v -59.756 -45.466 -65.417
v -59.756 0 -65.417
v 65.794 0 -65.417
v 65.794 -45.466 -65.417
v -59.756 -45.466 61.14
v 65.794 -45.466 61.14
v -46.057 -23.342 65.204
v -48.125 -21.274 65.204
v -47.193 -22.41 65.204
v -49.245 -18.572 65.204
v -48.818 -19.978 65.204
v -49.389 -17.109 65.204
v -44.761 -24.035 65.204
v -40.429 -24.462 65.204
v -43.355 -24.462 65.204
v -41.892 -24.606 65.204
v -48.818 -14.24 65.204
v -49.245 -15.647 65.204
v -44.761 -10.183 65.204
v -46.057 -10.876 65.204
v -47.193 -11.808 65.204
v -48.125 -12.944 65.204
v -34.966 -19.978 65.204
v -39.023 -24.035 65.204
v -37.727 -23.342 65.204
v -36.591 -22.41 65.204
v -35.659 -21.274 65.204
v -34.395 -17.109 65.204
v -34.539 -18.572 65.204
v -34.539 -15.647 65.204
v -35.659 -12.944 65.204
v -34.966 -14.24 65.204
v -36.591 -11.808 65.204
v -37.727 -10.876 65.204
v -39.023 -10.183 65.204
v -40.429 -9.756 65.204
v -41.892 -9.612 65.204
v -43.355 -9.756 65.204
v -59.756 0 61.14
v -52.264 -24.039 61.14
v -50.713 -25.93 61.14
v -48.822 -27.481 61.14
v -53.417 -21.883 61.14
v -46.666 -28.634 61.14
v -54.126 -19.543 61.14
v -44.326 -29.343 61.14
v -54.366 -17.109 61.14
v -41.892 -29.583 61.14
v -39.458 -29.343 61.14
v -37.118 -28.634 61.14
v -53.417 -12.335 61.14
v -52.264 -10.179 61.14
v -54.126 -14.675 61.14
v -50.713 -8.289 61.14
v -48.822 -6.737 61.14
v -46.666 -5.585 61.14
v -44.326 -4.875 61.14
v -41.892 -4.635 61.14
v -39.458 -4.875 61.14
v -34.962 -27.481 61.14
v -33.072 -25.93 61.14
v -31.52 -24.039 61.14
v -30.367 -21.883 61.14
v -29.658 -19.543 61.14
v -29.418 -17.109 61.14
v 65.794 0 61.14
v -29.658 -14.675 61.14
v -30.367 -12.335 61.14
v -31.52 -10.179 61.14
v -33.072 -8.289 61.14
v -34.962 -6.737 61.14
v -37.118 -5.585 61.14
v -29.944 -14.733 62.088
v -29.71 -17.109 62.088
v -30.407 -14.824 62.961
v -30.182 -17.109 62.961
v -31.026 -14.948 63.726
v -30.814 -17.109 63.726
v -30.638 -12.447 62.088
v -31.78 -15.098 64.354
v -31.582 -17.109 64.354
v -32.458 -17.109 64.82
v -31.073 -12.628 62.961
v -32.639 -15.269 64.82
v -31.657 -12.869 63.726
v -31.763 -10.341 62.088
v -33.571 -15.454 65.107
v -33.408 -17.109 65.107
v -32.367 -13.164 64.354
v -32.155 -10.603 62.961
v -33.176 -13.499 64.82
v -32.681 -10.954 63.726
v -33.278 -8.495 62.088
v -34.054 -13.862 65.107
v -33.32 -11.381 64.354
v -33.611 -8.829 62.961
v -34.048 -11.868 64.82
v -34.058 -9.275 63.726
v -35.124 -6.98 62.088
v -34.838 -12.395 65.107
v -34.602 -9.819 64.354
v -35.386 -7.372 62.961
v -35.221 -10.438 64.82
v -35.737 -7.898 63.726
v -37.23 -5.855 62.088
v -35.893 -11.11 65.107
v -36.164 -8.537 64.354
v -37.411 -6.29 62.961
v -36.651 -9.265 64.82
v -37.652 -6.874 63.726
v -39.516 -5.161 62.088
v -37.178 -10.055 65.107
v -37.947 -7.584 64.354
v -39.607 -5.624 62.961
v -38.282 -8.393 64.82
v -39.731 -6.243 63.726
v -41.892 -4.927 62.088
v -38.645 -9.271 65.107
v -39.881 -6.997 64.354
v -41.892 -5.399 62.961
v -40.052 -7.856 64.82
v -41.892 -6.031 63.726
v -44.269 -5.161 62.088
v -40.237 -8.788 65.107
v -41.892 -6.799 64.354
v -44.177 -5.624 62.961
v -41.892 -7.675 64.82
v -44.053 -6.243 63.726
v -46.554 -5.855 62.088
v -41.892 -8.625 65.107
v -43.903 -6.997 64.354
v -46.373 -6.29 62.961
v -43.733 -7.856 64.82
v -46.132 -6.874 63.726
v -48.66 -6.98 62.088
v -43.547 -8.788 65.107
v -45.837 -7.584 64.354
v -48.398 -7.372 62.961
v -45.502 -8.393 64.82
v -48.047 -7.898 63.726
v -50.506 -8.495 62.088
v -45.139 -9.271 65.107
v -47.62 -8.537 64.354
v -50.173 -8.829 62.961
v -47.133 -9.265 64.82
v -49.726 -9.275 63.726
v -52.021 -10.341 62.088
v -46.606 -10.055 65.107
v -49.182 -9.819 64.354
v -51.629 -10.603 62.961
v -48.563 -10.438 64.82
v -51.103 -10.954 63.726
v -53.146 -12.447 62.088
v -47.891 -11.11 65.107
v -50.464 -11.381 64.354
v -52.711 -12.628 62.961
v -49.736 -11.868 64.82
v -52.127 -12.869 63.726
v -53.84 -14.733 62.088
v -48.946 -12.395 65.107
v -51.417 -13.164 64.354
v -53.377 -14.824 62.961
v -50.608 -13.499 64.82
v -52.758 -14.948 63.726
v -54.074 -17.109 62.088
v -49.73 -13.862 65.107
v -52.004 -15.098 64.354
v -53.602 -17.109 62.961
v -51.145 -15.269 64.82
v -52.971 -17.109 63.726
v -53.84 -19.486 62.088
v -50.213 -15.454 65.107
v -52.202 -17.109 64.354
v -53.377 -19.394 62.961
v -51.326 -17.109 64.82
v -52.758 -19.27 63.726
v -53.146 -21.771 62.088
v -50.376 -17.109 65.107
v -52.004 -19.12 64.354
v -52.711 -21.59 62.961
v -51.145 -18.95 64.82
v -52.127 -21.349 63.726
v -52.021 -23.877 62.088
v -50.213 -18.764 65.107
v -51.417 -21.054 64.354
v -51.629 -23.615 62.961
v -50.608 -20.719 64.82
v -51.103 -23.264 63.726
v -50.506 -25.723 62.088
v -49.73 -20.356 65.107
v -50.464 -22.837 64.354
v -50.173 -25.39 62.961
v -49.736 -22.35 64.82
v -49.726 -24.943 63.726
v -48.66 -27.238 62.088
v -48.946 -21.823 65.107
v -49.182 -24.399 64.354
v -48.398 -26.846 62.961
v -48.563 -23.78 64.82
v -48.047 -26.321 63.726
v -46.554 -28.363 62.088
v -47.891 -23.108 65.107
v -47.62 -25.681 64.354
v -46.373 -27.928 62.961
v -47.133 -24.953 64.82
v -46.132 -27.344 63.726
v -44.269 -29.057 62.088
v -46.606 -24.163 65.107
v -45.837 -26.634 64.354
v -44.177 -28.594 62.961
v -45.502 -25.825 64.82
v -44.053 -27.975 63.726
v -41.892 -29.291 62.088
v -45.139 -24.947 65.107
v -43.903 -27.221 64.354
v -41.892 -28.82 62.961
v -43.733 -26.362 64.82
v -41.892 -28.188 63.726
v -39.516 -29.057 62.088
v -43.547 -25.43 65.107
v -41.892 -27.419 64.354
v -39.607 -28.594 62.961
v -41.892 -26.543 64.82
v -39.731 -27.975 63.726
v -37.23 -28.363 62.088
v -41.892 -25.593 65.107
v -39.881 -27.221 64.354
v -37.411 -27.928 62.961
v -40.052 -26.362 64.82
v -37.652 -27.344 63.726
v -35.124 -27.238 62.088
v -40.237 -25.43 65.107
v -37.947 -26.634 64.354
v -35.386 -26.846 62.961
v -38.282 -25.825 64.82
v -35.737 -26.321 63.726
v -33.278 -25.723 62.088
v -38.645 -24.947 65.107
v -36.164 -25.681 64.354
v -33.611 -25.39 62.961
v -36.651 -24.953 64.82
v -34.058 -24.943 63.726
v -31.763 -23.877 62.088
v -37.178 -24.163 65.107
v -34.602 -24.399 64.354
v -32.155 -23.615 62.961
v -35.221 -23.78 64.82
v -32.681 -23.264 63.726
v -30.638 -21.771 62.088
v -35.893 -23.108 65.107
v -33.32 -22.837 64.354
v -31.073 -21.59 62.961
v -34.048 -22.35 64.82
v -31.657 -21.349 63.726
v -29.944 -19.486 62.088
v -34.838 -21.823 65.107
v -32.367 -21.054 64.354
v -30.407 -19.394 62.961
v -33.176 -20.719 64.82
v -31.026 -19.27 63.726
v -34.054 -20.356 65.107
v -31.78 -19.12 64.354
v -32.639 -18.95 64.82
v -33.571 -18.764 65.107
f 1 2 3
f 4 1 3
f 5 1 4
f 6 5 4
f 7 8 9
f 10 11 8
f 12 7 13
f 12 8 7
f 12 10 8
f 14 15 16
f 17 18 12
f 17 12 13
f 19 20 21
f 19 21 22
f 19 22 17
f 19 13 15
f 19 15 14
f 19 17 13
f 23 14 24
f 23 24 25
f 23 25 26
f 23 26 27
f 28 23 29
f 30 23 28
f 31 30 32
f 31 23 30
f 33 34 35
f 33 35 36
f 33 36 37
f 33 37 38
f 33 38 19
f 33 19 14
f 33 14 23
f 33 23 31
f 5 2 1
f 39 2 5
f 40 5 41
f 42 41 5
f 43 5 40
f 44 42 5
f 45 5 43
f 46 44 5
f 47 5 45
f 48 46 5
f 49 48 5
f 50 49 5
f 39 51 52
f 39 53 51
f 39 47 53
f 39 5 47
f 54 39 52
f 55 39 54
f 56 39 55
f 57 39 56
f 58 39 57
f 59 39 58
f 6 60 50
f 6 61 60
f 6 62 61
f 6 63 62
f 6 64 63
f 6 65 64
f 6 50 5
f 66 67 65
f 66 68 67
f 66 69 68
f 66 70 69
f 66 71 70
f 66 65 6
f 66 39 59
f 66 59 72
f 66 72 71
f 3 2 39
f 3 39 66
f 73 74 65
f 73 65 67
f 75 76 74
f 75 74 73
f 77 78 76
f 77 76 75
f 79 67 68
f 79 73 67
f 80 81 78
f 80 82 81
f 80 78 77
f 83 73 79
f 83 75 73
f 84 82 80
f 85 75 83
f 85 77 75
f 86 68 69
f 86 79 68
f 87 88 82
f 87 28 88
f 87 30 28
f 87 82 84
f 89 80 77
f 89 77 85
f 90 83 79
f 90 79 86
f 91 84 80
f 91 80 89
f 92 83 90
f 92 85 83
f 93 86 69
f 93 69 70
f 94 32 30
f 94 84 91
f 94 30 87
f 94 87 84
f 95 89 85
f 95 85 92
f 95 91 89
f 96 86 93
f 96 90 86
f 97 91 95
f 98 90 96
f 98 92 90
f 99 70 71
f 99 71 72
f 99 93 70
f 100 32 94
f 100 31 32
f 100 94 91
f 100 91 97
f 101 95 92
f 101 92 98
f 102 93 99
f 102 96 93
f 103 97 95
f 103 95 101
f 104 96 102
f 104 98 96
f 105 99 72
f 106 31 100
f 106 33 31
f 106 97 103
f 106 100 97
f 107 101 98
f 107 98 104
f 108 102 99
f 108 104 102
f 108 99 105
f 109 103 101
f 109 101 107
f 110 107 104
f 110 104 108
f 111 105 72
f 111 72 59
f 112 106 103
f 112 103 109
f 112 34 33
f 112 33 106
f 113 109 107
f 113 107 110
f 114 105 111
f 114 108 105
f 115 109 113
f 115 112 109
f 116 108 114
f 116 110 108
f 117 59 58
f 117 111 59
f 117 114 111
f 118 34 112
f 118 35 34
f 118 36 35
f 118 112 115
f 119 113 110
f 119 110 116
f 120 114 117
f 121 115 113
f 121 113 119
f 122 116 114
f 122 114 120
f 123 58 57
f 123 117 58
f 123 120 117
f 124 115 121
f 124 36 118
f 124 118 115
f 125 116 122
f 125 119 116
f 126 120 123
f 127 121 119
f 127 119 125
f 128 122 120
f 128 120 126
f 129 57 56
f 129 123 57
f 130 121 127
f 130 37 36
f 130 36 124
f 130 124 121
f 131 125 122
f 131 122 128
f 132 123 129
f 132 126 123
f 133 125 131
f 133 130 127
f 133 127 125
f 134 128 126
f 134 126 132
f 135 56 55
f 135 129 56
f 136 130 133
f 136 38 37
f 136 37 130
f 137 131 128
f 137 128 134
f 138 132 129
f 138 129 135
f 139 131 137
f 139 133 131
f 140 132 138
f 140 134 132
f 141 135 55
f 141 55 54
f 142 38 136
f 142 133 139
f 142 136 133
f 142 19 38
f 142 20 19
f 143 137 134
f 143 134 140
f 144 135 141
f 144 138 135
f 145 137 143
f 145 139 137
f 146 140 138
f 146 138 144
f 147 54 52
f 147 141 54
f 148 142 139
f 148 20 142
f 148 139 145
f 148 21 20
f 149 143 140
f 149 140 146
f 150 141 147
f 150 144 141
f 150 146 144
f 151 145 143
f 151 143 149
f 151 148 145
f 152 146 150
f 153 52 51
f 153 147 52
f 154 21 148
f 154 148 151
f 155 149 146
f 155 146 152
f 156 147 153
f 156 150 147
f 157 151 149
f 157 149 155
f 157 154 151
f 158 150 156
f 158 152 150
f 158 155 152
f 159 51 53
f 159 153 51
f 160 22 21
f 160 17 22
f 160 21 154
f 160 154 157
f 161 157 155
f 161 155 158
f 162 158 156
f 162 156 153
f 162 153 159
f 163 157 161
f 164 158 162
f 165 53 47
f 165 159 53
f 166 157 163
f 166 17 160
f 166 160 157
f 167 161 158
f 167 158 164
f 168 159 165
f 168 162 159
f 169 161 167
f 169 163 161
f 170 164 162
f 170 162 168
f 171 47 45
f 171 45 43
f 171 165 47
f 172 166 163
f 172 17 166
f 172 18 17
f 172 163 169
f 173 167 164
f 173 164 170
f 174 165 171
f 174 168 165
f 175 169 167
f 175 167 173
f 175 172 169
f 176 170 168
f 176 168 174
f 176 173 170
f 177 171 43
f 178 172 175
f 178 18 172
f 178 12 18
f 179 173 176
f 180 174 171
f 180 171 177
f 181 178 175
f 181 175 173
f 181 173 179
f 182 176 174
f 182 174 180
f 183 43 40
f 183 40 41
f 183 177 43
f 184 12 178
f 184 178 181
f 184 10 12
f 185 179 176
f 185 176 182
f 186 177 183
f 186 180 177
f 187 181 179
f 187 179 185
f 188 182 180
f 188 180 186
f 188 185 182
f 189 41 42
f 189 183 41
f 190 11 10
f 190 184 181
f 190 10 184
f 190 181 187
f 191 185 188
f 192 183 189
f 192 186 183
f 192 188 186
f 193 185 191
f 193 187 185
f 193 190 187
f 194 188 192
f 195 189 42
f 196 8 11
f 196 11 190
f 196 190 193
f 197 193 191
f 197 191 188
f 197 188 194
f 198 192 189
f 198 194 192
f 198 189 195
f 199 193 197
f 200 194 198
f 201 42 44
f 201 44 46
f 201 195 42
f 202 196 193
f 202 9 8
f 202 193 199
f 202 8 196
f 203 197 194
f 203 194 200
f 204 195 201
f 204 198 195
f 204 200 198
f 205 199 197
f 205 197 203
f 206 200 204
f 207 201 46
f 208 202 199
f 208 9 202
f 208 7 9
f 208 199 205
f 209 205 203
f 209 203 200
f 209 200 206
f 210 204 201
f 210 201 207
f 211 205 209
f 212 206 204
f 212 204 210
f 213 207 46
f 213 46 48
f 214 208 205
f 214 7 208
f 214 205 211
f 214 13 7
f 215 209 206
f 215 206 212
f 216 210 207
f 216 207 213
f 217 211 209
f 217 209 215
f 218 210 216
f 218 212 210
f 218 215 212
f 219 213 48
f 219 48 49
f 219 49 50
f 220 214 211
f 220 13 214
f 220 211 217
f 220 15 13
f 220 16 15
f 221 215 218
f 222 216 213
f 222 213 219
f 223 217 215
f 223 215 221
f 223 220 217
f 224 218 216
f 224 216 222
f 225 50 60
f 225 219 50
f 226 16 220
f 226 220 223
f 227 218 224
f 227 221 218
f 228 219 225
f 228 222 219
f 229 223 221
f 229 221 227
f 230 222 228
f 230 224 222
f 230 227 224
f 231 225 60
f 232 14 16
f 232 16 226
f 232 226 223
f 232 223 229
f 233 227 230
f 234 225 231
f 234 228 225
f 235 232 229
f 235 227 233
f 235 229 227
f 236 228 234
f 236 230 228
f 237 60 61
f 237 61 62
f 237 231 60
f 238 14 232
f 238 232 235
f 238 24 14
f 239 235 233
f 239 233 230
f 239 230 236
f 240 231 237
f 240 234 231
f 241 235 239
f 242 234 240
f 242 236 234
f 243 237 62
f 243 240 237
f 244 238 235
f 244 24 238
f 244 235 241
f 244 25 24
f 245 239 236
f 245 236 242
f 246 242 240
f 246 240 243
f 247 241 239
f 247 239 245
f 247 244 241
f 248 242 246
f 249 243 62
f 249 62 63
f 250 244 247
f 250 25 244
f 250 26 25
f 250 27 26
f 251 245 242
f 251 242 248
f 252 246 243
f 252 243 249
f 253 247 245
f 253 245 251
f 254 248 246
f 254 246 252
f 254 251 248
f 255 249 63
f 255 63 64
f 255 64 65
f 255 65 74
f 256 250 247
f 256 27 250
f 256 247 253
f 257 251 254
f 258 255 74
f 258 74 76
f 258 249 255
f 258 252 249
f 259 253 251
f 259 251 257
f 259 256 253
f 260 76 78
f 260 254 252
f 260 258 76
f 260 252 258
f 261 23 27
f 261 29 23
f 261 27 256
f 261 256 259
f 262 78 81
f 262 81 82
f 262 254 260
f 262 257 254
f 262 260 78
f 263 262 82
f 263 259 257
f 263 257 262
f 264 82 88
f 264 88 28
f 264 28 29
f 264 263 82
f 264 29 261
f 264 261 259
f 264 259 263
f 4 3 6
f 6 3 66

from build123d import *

# Parameters (mm, degrees)
F0_W     = 125.5502849817
F0_H     = 126.5566982329
F1_DEPTH = 45.466
F2_R     = 12.4740683963
F3_DEPTH = 4.064


# Not quite as in the source:
# - a fillet or chamfer that OpenCascade refuses, or shapes differently, is made with other operations: its cross-section is extruded or revolved along the edge and cut away or added


with BuildPart() as f1:
    # F0 (on Front) → F1 (new body)
    with BuildSketch(Plane.XZ):
        with Locations((3.0192434788, -2.1386351436)):
            Rectangle(F0_W, F0_H)
    extrude(amount=F1_DEPTH)

    # F2 (on face) → F3 (join)
    with BuildSketch(Plane.XY.offset(61.1397139728)):
        with Locations((-41.892029345, -17.1090569347)):
            Circle(F2_R)
    extrude(amount=F3_DEPTH)

    # F4: fillet of radius 5.08 on 1 edges, made by hand

    # F4_s1 → F4_t2 (revolve, cut)
    with BuildSketch(Plane.XZ.offset(17.1090569347)):
        with BuildLine():
            ThreePointArc((-29.4179609488, 61.1397139728), (-31.1824500034, 64.0586650526), (-34.3953241061, 65.2037139728))
            Line((-34.3953241061, 65.2037139728), (-29.4179609488, 65.2037139728))
            Line((-29.4179609488, 65.2037139728), (-29.4179609488, 61.1397139728))
        make_face()
    revolve(axis=Axis((-41.892029345, -17.1090569347, 65.2037139728), (0, 0, 1)), mode=Mode.SUBTRACT)


solid = f1.part
